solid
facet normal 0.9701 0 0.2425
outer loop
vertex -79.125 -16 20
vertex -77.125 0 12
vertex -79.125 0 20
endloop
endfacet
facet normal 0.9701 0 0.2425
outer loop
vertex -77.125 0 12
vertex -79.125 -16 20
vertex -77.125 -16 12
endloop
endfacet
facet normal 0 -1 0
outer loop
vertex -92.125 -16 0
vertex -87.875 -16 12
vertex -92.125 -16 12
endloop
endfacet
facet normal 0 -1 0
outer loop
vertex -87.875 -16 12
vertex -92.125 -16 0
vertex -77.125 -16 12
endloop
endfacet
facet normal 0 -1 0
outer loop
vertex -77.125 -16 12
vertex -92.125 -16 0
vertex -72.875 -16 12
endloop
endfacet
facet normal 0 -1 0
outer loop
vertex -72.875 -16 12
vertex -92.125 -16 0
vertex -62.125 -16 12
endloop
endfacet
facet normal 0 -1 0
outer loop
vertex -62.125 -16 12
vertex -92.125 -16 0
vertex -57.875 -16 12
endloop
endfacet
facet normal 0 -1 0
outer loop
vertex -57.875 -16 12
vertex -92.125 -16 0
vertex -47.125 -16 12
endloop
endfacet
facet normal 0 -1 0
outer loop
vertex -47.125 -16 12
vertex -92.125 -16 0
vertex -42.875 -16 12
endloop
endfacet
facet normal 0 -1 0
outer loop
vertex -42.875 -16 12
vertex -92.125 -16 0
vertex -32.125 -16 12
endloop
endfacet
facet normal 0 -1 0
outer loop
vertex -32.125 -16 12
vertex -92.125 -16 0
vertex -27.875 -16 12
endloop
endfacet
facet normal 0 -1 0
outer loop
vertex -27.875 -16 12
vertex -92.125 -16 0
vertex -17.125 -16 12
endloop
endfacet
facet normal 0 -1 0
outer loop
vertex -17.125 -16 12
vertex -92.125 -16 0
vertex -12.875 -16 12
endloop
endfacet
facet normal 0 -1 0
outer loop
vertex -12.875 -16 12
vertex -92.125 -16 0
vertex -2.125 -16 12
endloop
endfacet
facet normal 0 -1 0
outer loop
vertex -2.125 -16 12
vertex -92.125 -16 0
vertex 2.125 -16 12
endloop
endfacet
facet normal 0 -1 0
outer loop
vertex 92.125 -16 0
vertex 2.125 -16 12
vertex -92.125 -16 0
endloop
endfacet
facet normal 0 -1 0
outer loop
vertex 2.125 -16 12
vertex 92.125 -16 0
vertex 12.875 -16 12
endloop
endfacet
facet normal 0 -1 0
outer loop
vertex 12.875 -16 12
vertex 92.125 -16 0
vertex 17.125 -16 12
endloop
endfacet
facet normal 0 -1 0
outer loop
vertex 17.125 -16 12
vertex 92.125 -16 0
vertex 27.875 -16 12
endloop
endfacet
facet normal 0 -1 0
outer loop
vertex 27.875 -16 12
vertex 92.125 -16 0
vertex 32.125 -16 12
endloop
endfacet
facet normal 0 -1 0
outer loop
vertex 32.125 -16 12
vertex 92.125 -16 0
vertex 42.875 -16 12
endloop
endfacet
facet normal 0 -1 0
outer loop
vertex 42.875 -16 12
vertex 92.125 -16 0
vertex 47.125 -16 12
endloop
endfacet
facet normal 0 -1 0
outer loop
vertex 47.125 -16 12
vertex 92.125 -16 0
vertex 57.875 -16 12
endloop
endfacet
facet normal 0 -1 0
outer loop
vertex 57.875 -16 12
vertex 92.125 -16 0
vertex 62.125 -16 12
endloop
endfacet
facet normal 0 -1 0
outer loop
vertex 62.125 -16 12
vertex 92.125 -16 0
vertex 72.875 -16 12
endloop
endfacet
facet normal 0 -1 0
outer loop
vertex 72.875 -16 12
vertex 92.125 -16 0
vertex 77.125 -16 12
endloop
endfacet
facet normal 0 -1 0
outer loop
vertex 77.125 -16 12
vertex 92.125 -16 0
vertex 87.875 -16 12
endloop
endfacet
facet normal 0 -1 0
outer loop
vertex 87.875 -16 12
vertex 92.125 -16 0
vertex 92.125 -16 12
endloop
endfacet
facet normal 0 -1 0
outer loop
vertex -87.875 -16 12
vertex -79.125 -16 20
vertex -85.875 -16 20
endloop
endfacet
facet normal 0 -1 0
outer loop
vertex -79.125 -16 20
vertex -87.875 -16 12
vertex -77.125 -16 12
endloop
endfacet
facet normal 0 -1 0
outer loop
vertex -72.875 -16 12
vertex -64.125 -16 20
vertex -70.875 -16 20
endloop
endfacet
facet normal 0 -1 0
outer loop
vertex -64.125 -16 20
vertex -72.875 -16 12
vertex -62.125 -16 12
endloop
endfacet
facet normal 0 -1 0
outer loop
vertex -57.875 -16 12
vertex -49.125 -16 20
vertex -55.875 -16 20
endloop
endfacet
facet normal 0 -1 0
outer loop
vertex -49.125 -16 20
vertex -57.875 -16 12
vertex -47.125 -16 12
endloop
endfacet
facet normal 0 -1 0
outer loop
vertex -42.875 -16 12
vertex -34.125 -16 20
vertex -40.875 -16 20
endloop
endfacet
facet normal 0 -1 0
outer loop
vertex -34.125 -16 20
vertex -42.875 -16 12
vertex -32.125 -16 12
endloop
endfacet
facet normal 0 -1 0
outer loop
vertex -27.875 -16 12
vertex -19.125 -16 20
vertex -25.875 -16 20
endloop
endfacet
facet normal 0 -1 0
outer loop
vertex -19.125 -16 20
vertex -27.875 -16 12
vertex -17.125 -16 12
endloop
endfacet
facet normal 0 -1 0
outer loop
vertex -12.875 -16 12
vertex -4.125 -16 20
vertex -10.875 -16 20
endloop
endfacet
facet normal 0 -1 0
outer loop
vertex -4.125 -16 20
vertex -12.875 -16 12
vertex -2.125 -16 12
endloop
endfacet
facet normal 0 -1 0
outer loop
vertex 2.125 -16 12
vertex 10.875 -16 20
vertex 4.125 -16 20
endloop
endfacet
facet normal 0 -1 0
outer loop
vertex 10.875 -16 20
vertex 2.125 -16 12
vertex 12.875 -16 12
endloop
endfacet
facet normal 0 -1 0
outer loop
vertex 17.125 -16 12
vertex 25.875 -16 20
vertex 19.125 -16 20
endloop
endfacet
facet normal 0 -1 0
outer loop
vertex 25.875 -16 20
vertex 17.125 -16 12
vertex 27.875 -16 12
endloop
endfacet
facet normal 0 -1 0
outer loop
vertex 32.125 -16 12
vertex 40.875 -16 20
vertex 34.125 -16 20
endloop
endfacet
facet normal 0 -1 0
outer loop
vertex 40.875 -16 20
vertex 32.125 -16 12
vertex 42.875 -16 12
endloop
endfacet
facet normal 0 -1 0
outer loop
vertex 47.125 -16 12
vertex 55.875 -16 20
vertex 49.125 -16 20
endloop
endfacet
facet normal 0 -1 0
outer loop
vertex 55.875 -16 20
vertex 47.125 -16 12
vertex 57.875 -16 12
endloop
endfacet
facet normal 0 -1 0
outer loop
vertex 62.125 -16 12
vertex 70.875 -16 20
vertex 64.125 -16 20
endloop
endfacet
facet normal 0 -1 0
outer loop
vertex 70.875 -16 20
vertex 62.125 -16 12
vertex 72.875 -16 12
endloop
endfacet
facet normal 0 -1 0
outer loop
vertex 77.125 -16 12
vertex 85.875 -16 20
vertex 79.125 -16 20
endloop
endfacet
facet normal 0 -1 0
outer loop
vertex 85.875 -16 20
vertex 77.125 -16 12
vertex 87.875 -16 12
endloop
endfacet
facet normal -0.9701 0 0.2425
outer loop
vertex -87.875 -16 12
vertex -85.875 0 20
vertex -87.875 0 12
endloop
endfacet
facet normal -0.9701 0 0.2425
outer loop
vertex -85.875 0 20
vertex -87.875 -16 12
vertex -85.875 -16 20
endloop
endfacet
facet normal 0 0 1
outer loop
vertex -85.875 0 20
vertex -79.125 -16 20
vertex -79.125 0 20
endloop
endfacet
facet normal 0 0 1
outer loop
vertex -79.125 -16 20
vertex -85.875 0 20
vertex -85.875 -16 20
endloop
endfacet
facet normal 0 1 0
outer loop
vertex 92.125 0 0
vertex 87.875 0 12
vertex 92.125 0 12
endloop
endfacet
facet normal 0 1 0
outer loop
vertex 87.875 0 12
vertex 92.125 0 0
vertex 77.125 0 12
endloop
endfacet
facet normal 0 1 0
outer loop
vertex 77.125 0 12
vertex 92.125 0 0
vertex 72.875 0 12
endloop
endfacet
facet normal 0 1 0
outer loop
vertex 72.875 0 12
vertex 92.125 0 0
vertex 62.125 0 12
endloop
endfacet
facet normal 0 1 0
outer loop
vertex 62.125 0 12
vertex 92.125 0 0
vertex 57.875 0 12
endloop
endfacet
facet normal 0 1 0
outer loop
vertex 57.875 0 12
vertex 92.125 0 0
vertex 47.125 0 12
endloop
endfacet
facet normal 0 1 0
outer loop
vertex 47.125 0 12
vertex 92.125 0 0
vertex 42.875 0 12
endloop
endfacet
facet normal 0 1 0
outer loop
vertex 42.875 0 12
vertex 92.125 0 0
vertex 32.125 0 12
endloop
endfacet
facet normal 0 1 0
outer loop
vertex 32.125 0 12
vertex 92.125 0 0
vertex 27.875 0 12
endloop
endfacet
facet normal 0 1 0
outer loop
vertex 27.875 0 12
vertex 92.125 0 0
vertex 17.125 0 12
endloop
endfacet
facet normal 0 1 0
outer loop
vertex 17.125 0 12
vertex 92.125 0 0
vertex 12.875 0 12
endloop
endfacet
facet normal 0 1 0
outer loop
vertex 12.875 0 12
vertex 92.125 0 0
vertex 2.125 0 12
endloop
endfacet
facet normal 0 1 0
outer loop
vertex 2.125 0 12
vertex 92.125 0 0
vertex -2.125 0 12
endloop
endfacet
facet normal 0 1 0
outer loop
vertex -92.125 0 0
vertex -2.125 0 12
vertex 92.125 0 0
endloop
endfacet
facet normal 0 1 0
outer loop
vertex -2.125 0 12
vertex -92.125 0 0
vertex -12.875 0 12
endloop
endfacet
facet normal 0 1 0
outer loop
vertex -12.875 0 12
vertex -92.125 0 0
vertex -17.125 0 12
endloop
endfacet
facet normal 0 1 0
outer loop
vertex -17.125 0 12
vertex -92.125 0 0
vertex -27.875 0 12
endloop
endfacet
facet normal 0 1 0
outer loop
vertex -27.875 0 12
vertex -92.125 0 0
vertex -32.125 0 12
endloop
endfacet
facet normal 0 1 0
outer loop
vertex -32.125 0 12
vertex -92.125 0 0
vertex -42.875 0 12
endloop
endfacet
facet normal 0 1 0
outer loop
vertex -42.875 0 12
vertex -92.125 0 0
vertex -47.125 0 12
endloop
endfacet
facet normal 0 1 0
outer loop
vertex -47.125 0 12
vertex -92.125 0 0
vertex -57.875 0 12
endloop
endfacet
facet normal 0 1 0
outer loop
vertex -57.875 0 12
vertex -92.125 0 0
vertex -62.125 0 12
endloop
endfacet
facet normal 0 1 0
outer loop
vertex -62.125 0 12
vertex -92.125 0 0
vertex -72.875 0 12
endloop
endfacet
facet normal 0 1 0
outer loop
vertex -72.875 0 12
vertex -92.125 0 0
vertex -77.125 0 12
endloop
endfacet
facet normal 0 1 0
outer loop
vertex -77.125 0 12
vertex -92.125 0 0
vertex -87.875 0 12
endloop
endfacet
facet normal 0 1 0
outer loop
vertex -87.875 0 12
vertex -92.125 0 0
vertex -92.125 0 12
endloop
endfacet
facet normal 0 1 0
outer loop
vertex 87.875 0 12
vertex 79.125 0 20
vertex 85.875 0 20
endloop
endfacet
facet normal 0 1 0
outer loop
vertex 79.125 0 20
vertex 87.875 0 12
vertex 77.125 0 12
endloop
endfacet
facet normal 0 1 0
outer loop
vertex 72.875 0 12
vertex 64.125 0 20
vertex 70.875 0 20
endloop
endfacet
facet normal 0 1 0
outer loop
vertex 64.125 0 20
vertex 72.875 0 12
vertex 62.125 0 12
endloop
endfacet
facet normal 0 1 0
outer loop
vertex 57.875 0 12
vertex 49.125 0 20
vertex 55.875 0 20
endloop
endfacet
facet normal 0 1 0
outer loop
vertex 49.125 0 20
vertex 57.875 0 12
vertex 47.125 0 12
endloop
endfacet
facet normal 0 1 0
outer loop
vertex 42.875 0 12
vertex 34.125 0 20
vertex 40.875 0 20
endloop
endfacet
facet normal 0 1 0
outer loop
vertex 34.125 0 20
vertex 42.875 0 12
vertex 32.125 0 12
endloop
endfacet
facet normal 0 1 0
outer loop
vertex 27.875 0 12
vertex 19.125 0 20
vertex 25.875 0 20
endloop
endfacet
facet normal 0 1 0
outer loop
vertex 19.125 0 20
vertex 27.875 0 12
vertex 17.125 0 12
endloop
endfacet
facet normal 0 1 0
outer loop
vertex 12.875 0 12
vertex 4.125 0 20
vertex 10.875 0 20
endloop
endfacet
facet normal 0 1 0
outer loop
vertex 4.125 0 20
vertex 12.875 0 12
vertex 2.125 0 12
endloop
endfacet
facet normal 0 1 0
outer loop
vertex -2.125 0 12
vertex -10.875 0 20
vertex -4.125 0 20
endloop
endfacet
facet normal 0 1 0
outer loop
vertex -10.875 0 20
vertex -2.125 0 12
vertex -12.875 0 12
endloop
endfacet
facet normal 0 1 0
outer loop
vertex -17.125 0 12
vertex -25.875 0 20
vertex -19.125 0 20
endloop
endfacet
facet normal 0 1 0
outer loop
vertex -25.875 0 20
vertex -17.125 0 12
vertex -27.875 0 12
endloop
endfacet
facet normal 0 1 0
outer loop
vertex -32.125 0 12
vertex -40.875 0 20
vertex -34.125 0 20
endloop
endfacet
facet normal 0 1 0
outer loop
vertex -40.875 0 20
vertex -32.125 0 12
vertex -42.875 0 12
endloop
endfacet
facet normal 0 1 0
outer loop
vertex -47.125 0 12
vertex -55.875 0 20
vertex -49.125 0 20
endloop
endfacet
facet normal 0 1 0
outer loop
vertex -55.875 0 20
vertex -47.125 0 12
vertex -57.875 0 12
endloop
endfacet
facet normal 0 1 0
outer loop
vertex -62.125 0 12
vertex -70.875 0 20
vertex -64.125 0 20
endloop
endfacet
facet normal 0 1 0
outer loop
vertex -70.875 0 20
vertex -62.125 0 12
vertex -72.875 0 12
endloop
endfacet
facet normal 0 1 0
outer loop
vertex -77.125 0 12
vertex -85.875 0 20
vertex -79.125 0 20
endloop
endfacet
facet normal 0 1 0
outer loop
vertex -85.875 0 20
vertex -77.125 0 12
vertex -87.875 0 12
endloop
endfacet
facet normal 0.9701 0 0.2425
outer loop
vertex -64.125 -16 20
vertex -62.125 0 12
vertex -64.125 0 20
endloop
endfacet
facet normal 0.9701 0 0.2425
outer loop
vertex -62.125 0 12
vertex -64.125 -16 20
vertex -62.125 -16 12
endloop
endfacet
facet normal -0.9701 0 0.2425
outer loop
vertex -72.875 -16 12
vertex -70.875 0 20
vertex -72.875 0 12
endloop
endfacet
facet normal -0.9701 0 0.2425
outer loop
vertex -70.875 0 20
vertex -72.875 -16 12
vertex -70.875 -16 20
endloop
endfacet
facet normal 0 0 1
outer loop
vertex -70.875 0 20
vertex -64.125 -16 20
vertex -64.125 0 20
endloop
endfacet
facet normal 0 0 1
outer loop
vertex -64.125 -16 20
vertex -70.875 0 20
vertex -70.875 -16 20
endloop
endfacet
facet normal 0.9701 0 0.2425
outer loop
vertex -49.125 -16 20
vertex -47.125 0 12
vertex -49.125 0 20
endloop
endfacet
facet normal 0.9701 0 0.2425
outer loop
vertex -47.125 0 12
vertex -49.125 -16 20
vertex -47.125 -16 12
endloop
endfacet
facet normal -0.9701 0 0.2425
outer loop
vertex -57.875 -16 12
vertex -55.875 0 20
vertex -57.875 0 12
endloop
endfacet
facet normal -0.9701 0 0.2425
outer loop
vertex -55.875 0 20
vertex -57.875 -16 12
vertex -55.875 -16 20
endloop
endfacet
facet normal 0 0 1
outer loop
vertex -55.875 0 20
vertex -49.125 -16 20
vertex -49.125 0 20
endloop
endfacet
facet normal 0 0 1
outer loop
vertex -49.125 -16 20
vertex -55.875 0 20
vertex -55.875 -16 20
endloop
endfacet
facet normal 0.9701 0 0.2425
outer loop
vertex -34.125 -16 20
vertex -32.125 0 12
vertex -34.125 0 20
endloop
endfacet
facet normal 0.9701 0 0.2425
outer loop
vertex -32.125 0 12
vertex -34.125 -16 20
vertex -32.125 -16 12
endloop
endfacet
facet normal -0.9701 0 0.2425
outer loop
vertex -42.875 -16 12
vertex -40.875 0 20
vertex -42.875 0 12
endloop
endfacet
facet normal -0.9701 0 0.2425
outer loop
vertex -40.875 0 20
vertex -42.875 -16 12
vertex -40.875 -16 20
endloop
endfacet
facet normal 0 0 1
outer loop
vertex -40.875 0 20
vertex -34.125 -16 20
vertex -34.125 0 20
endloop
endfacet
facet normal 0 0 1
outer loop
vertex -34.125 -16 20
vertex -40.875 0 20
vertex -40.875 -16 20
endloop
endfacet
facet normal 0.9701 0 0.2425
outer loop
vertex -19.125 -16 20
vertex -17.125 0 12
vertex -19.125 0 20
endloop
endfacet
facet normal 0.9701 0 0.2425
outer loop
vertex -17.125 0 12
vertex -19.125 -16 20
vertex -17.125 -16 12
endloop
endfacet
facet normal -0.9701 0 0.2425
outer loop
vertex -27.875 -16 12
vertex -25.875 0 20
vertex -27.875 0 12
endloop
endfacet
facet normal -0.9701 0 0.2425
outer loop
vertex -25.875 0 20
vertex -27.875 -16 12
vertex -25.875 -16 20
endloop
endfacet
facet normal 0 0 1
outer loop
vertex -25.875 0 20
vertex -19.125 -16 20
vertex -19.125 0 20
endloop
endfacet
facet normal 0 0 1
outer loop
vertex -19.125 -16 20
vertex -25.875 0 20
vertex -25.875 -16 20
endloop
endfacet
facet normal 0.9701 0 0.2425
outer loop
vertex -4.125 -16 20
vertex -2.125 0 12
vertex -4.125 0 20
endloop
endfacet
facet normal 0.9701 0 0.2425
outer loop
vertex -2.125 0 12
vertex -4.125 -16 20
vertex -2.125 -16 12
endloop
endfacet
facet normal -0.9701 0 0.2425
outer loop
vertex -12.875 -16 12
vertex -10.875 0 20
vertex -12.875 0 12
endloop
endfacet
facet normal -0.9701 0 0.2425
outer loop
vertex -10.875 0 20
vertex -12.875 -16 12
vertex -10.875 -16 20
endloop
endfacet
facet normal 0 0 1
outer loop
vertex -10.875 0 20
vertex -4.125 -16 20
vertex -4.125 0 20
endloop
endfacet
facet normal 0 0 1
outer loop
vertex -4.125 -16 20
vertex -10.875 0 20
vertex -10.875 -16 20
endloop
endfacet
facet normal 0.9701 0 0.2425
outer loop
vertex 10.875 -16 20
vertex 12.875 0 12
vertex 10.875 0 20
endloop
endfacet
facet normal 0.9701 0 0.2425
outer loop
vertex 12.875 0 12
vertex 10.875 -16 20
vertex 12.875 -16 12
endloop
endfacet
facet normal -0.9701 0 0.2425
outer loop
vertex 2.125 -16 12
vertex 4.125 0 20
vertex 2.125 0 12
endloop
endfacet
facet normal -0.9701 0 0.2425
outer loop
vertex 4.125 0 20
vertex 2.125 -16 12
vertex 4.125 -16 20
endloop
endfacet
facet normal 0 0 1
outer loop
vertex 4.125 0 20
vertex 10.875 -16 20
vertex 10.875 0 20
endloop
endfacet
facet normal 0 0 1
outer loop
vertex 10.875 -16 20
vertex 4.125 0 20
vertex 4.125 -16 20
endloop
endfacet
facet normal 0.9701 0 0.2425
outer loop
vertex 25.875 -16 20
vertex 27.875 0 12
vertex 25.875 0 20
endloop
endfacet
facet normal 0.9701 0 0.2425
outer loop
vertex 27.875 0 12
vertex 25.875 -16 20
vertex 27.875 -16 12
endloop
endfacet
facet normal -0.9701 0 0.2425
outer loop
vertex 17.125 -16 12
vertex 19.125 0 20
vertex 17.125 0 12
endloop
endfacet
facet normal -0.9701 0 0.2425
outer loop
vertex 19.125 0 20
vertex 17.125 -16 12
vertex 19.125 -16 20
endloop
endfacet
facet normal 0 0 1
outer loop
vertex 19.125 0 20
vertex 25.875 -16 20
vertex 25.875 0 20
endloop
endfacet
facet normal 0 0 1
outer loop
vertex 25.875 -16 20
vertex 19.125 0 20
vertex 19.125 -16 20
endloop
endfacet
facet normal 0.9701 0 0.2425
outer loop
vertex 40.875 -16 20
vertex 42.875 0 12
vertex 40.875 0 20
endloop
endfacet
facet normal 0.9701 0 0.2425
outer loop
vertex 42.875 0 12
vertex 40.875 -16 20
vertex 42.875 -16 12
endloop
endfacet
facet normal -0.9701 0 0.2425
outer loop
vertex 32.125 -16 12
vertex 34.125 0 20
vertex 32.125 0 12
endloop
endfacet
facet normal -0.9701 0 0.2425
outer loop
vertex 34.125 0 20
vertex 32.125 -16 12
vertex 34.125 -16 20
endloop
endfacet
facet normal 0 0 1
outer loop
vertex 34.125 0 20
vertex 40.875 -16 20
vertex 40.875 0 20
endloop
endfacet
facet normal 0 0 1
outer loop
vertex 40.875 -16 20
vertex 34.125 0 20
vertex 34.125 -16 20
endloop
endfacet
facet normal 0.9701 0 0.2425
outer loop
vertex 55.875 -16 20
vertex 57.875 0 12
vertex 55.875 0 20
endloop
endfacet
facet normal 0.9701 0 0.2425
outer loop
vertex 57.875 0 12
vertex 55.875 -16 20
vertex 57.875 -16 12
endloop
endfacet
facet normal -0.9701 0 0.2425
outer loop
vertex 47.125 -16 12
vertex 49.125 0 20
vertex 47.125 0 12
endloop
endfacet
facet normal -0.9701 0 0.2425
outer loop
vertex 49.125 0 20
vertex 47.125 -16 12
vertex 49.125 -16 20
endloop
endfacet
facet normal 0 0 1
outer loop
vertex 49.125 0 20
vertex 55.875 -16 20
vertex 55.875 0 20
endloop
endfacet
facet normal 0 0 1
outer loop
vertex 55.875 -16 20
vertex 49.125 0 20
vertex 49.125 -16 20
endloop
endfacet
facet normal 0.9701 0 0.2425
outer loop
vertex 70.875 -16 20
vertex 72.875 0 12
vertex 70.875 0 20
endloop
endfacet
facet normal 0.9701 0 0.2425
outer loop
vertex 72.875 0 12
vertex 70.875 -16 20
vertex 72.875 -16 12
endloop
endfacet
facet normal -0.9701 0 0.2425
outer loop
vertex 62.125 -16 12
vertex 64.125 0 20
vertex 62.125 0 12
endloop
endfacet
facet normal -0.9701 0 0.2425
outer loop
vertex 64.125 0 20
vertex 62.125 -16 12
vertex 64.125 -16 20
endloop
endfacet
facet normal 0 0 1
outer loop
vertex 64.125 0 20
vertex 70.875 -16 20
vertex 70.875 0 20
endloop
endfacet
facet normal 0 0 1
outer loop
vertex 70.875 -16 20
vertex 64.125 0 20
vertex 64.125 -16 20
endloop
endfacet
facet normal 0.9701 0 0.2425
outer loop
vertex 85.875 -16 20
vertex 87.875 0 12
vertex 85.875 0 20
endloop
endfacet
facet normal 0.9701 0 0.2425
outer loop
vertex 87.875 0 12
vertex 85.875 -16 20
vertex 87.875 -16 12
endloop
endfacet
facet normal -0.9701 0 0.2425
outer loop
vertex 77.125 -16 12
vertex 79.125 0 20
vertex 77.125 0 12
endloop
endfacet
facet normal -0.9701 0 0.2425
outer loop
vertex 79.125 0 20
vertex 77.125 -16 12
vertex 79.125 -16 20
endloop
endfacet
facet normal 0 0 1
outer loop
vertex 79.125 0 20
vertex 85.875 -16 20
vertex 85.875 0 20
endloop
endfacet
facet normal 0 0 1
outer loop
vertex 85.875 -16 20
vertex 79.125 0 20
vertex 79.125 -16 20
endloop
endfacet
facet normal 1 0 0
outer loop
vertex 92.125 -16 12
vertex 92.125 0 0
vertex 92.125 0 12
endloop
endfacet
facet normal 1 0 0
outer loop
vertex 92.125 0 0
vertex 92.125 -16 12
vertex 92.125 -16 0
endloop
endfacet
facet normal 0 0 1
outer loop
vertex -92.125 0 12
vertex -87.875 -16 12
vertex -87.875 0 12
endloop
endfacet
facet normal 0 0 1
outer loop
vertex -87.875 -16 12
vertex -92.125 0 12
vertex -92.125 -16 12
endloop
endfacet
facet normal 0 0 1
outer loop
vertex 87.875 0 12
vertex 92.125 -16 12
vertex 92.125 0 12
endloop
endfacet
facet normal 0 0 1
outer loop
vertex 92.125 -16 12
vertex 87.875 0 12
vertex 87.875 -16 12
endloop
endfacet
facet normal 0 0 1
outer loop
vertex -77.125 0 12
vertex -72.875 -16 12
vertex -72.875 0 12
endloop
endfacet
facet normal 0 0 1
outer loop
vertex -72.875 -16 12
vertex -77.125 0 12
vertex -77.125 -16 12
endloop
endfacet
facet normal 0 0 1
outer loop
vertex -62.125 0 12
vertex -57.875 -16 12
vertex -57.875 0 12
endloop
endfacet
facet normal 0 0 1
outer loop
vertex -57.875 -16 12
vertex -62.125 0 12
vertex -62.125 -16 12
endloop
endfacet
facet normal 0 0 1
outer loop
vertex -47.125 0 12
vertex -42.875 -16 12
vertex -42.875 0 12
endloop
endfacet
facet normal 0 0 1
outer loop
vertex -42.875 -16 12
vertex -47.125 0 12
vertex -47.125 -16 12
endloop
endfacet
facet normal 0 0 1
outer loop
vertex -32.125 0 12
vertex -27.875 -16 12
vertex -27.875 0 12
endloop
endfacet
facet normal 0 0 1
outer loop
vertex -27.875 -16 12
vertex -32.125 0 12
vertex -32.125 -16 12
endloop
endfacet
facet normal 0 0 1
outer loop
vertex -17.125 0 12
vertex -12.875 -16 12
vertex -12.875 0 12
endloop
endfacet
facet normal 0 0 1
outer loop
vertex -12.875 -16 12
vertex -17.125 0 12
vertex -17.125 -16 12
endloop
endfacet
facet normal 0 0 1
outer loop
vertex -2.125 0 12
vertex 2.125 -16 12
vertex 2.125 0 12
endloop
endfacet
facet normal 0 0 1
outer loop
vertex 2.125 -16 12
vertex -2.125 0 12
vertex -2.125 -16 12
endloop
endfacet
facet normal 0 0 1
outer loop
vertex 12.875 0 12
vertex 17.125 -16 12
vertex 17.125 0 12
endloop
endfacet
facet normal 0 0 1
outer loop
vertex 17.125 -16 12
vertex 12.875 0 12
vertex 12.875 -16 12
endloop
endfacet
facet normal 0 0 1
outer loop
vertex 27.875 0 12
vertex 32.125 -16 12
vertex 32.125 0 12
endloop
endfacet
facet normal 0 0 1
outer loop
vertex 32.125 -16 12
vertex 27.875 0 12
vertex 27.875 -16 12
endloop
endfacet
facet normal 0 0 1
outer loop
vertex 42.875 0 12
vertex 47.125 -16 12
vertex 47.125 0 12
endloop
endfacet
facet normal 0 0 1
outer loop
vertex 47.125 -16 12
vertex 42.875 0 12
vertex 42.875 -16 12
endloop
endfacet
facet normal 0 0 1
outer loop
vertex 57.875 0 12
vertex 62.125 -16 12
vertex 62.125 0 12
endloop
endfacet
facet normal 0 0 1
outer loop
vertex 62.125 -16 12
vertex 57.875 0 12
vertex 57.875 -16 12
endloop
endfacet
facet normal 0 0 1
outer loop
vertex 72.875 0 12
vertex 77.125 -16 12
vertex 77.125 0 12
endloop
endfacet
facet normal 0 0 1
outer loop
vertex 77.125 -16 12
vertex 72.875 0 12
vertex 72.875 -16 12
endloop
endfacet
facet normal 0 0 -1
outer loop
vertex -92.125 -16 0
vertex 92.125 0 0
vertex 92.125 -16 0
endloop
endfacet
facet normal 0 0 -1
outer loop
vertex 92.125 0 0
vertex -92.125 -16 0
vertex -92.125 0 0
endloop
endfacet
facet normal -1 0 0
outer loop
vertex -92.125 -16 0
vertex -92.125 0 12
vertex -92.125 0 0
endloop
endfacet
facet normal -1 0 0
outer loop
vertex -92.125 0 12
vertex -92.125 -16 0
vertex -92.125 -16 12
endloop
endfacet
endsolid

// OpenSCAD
$fn = 32;

// ----------------------------------------------------------------------
// Toothed rack, 12 teeth
// 15 mm pitch, 8 mm teeth
// ----------------------------------------------------------------------

// --- parameters (mm) ---
bar_w = 16;      // bar width (Y)
bar_h = 12;      // bar height (Z)
teeth = 12;      // number of teeth
pitch = 15;      // tooth pitch
tooth_h = 8;     // tooth height above the bar
root_w = 11.25;  // tooth width at the root
crest_w = 6.75;  // tooth width at the crest

// --- derived feature positions (mm) ---
span = (teeth - 1) * pitch;  // = 165   distance between the outer teeth
bar_l = span + root_w + 8;   // = 184.25   bar length: teeth plus 4 mm at each end
tooth_x = -span / 2;         // = -82.5   X of the first tooth
height = bar_h + tooth_h;    // = 20   overall height
feature_centers = [
  [tooth_x + 0 * pitch, -bar_w / 2],
  [tooth_x + 1 * pitch, -bar_w / 2],
  [tooth_x + 2 * pitch, -bar_w / 2],
  [tooth_x + 3 * pitch, -bar_w / 2],
  [tooth_x + 4 * pitch, -bar_w / 2],
  [tooth_x + 5 * pitch, -bar_w / 2],
  [tooth_x + 6 * pitch, -bar_w / 2],
  [tooth_x + 7 * pitch, -bar_w / 2],
  [tooth_x + 8 * pitch, -bar_w / 2],
  [tooth_x + 9 * pitch, -bar_w / 2],
  [tooth_x + 10 * pitch, -bar_w / 2],
  [tooth_x + 11 * pitch, -bar_w / 2]
];   // tooth centre line, drives the tooth loop

// bar with a rack of teeth, one extruded trapezoium per centre
module rack_tooth() {
  linear_extrude(height = bar_w)
    polygon(points = [
      [0, 0],
      [root_w, 0],
      [root_w / 2 + crest_w / 2, tooth_h + 1],
      [root_w / 2 - crest_w / 2, tooth_h + 1]
    ]);
}

union() {
  translate([-bar_l / 2, -bar_w, 0]) cube([bar_l, bar_w, bar_h]);
  for (centre = feature_centers)
    translate([centre[0] - root_w / 2, 0, bar_h - 1]) rotate([90, 0, 0]) rack_tooth();
}
